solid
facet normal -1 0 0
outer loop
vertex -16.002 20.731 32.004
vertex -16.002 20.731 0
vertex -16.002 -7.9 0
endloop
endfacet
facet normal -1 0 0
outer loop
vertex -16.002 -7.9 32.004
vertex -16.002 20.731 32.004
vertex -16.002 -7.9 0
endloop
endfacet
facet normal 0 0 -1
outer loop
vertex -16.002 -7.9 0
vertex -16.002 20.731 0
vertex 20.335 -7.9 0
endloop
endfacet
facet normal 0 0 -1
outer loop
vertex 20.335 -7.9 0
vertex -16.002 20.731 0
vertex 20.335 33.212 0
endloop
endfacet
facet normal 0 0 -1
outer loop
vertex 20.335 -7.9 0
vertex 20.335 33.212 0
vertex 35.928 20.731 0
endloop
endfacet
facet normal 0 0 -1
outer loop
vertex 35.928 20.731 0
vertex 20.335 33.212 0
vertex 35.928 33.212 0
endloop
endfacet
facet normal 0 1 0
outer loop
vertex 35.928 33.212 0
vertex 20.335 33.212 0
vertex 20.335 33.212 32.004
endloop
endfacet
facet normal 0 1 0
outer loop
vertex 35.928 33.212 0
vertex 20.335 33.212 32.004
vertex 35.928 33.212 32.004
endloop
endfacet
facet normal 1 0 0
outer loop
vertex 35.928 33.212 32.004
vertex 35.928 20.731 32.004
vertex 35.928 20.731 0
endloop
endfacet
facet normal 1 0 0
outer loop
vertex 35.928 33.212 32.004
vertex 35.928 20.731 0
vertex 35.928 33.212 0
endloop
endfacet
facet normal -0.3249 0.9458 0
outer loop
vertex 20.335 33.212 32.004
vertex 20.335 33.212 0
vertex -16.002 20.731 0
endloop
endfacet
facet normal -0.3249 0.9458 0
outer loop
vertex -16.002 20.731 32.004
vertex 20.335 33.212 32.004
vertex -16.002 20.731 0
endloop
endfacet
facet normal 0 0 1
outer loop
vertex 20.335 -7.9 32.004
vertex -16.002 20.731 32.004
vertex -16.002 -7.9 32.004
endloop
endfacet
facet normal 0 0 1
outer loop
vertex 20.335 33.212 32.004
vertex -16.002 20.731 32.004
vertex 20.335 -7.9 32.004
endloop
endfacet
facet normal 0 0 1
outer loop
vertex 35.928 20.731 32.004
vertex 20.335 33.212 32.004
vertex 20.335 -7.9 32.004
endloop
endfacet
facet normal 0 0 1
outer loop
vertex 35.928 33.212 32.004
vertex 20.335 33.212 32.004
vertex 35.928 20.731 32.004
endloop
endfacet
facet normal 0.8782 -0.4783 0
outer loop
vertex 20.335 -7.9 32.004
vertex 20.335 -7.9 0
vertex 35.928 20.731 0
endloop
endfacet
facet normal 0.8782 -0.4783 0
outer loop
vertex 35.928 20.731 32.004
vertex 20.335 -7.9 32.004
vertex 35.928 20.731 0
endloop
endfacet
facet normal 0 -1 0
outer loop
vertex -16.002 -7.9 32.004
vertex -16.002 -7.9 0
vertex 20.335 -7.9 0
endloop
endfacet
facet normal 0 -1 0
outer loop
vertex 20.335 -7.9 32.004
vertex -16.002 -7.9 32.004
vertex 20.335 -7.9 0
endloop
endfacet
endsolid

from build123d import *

# Parameters (mm, degrees)
F0_W     = 15.59283
F0_H     = 12.481529
F1_DEPTH = 32.004


with BuildPart() as f1:
    # F0 (on Top) → F1 (new body)
    with BuildSketch(Plane.XY):
        Polygon((-16.001523, -7.900454), (20.335106, -7.900454), (20.335106, 20.730838), (10.882463, 20.730838), (-16.001523, 20.730838), align=None)
        Polygon((20.335106, 20.730838), (20.335106, -7.900454), (35.927936, 20.730838), align=None)
        with Locations((28.131521, 26.971602)):
            Rectangle(F0_W, F0_H)
        Polygon((10.882463, 20.730838), (20.335106, 20.730838), (20.335106, 33.212367), (-16.001523, 20.730838), align=None)
    extrude(amount=F1_DEPTH)


solid = f1.part
